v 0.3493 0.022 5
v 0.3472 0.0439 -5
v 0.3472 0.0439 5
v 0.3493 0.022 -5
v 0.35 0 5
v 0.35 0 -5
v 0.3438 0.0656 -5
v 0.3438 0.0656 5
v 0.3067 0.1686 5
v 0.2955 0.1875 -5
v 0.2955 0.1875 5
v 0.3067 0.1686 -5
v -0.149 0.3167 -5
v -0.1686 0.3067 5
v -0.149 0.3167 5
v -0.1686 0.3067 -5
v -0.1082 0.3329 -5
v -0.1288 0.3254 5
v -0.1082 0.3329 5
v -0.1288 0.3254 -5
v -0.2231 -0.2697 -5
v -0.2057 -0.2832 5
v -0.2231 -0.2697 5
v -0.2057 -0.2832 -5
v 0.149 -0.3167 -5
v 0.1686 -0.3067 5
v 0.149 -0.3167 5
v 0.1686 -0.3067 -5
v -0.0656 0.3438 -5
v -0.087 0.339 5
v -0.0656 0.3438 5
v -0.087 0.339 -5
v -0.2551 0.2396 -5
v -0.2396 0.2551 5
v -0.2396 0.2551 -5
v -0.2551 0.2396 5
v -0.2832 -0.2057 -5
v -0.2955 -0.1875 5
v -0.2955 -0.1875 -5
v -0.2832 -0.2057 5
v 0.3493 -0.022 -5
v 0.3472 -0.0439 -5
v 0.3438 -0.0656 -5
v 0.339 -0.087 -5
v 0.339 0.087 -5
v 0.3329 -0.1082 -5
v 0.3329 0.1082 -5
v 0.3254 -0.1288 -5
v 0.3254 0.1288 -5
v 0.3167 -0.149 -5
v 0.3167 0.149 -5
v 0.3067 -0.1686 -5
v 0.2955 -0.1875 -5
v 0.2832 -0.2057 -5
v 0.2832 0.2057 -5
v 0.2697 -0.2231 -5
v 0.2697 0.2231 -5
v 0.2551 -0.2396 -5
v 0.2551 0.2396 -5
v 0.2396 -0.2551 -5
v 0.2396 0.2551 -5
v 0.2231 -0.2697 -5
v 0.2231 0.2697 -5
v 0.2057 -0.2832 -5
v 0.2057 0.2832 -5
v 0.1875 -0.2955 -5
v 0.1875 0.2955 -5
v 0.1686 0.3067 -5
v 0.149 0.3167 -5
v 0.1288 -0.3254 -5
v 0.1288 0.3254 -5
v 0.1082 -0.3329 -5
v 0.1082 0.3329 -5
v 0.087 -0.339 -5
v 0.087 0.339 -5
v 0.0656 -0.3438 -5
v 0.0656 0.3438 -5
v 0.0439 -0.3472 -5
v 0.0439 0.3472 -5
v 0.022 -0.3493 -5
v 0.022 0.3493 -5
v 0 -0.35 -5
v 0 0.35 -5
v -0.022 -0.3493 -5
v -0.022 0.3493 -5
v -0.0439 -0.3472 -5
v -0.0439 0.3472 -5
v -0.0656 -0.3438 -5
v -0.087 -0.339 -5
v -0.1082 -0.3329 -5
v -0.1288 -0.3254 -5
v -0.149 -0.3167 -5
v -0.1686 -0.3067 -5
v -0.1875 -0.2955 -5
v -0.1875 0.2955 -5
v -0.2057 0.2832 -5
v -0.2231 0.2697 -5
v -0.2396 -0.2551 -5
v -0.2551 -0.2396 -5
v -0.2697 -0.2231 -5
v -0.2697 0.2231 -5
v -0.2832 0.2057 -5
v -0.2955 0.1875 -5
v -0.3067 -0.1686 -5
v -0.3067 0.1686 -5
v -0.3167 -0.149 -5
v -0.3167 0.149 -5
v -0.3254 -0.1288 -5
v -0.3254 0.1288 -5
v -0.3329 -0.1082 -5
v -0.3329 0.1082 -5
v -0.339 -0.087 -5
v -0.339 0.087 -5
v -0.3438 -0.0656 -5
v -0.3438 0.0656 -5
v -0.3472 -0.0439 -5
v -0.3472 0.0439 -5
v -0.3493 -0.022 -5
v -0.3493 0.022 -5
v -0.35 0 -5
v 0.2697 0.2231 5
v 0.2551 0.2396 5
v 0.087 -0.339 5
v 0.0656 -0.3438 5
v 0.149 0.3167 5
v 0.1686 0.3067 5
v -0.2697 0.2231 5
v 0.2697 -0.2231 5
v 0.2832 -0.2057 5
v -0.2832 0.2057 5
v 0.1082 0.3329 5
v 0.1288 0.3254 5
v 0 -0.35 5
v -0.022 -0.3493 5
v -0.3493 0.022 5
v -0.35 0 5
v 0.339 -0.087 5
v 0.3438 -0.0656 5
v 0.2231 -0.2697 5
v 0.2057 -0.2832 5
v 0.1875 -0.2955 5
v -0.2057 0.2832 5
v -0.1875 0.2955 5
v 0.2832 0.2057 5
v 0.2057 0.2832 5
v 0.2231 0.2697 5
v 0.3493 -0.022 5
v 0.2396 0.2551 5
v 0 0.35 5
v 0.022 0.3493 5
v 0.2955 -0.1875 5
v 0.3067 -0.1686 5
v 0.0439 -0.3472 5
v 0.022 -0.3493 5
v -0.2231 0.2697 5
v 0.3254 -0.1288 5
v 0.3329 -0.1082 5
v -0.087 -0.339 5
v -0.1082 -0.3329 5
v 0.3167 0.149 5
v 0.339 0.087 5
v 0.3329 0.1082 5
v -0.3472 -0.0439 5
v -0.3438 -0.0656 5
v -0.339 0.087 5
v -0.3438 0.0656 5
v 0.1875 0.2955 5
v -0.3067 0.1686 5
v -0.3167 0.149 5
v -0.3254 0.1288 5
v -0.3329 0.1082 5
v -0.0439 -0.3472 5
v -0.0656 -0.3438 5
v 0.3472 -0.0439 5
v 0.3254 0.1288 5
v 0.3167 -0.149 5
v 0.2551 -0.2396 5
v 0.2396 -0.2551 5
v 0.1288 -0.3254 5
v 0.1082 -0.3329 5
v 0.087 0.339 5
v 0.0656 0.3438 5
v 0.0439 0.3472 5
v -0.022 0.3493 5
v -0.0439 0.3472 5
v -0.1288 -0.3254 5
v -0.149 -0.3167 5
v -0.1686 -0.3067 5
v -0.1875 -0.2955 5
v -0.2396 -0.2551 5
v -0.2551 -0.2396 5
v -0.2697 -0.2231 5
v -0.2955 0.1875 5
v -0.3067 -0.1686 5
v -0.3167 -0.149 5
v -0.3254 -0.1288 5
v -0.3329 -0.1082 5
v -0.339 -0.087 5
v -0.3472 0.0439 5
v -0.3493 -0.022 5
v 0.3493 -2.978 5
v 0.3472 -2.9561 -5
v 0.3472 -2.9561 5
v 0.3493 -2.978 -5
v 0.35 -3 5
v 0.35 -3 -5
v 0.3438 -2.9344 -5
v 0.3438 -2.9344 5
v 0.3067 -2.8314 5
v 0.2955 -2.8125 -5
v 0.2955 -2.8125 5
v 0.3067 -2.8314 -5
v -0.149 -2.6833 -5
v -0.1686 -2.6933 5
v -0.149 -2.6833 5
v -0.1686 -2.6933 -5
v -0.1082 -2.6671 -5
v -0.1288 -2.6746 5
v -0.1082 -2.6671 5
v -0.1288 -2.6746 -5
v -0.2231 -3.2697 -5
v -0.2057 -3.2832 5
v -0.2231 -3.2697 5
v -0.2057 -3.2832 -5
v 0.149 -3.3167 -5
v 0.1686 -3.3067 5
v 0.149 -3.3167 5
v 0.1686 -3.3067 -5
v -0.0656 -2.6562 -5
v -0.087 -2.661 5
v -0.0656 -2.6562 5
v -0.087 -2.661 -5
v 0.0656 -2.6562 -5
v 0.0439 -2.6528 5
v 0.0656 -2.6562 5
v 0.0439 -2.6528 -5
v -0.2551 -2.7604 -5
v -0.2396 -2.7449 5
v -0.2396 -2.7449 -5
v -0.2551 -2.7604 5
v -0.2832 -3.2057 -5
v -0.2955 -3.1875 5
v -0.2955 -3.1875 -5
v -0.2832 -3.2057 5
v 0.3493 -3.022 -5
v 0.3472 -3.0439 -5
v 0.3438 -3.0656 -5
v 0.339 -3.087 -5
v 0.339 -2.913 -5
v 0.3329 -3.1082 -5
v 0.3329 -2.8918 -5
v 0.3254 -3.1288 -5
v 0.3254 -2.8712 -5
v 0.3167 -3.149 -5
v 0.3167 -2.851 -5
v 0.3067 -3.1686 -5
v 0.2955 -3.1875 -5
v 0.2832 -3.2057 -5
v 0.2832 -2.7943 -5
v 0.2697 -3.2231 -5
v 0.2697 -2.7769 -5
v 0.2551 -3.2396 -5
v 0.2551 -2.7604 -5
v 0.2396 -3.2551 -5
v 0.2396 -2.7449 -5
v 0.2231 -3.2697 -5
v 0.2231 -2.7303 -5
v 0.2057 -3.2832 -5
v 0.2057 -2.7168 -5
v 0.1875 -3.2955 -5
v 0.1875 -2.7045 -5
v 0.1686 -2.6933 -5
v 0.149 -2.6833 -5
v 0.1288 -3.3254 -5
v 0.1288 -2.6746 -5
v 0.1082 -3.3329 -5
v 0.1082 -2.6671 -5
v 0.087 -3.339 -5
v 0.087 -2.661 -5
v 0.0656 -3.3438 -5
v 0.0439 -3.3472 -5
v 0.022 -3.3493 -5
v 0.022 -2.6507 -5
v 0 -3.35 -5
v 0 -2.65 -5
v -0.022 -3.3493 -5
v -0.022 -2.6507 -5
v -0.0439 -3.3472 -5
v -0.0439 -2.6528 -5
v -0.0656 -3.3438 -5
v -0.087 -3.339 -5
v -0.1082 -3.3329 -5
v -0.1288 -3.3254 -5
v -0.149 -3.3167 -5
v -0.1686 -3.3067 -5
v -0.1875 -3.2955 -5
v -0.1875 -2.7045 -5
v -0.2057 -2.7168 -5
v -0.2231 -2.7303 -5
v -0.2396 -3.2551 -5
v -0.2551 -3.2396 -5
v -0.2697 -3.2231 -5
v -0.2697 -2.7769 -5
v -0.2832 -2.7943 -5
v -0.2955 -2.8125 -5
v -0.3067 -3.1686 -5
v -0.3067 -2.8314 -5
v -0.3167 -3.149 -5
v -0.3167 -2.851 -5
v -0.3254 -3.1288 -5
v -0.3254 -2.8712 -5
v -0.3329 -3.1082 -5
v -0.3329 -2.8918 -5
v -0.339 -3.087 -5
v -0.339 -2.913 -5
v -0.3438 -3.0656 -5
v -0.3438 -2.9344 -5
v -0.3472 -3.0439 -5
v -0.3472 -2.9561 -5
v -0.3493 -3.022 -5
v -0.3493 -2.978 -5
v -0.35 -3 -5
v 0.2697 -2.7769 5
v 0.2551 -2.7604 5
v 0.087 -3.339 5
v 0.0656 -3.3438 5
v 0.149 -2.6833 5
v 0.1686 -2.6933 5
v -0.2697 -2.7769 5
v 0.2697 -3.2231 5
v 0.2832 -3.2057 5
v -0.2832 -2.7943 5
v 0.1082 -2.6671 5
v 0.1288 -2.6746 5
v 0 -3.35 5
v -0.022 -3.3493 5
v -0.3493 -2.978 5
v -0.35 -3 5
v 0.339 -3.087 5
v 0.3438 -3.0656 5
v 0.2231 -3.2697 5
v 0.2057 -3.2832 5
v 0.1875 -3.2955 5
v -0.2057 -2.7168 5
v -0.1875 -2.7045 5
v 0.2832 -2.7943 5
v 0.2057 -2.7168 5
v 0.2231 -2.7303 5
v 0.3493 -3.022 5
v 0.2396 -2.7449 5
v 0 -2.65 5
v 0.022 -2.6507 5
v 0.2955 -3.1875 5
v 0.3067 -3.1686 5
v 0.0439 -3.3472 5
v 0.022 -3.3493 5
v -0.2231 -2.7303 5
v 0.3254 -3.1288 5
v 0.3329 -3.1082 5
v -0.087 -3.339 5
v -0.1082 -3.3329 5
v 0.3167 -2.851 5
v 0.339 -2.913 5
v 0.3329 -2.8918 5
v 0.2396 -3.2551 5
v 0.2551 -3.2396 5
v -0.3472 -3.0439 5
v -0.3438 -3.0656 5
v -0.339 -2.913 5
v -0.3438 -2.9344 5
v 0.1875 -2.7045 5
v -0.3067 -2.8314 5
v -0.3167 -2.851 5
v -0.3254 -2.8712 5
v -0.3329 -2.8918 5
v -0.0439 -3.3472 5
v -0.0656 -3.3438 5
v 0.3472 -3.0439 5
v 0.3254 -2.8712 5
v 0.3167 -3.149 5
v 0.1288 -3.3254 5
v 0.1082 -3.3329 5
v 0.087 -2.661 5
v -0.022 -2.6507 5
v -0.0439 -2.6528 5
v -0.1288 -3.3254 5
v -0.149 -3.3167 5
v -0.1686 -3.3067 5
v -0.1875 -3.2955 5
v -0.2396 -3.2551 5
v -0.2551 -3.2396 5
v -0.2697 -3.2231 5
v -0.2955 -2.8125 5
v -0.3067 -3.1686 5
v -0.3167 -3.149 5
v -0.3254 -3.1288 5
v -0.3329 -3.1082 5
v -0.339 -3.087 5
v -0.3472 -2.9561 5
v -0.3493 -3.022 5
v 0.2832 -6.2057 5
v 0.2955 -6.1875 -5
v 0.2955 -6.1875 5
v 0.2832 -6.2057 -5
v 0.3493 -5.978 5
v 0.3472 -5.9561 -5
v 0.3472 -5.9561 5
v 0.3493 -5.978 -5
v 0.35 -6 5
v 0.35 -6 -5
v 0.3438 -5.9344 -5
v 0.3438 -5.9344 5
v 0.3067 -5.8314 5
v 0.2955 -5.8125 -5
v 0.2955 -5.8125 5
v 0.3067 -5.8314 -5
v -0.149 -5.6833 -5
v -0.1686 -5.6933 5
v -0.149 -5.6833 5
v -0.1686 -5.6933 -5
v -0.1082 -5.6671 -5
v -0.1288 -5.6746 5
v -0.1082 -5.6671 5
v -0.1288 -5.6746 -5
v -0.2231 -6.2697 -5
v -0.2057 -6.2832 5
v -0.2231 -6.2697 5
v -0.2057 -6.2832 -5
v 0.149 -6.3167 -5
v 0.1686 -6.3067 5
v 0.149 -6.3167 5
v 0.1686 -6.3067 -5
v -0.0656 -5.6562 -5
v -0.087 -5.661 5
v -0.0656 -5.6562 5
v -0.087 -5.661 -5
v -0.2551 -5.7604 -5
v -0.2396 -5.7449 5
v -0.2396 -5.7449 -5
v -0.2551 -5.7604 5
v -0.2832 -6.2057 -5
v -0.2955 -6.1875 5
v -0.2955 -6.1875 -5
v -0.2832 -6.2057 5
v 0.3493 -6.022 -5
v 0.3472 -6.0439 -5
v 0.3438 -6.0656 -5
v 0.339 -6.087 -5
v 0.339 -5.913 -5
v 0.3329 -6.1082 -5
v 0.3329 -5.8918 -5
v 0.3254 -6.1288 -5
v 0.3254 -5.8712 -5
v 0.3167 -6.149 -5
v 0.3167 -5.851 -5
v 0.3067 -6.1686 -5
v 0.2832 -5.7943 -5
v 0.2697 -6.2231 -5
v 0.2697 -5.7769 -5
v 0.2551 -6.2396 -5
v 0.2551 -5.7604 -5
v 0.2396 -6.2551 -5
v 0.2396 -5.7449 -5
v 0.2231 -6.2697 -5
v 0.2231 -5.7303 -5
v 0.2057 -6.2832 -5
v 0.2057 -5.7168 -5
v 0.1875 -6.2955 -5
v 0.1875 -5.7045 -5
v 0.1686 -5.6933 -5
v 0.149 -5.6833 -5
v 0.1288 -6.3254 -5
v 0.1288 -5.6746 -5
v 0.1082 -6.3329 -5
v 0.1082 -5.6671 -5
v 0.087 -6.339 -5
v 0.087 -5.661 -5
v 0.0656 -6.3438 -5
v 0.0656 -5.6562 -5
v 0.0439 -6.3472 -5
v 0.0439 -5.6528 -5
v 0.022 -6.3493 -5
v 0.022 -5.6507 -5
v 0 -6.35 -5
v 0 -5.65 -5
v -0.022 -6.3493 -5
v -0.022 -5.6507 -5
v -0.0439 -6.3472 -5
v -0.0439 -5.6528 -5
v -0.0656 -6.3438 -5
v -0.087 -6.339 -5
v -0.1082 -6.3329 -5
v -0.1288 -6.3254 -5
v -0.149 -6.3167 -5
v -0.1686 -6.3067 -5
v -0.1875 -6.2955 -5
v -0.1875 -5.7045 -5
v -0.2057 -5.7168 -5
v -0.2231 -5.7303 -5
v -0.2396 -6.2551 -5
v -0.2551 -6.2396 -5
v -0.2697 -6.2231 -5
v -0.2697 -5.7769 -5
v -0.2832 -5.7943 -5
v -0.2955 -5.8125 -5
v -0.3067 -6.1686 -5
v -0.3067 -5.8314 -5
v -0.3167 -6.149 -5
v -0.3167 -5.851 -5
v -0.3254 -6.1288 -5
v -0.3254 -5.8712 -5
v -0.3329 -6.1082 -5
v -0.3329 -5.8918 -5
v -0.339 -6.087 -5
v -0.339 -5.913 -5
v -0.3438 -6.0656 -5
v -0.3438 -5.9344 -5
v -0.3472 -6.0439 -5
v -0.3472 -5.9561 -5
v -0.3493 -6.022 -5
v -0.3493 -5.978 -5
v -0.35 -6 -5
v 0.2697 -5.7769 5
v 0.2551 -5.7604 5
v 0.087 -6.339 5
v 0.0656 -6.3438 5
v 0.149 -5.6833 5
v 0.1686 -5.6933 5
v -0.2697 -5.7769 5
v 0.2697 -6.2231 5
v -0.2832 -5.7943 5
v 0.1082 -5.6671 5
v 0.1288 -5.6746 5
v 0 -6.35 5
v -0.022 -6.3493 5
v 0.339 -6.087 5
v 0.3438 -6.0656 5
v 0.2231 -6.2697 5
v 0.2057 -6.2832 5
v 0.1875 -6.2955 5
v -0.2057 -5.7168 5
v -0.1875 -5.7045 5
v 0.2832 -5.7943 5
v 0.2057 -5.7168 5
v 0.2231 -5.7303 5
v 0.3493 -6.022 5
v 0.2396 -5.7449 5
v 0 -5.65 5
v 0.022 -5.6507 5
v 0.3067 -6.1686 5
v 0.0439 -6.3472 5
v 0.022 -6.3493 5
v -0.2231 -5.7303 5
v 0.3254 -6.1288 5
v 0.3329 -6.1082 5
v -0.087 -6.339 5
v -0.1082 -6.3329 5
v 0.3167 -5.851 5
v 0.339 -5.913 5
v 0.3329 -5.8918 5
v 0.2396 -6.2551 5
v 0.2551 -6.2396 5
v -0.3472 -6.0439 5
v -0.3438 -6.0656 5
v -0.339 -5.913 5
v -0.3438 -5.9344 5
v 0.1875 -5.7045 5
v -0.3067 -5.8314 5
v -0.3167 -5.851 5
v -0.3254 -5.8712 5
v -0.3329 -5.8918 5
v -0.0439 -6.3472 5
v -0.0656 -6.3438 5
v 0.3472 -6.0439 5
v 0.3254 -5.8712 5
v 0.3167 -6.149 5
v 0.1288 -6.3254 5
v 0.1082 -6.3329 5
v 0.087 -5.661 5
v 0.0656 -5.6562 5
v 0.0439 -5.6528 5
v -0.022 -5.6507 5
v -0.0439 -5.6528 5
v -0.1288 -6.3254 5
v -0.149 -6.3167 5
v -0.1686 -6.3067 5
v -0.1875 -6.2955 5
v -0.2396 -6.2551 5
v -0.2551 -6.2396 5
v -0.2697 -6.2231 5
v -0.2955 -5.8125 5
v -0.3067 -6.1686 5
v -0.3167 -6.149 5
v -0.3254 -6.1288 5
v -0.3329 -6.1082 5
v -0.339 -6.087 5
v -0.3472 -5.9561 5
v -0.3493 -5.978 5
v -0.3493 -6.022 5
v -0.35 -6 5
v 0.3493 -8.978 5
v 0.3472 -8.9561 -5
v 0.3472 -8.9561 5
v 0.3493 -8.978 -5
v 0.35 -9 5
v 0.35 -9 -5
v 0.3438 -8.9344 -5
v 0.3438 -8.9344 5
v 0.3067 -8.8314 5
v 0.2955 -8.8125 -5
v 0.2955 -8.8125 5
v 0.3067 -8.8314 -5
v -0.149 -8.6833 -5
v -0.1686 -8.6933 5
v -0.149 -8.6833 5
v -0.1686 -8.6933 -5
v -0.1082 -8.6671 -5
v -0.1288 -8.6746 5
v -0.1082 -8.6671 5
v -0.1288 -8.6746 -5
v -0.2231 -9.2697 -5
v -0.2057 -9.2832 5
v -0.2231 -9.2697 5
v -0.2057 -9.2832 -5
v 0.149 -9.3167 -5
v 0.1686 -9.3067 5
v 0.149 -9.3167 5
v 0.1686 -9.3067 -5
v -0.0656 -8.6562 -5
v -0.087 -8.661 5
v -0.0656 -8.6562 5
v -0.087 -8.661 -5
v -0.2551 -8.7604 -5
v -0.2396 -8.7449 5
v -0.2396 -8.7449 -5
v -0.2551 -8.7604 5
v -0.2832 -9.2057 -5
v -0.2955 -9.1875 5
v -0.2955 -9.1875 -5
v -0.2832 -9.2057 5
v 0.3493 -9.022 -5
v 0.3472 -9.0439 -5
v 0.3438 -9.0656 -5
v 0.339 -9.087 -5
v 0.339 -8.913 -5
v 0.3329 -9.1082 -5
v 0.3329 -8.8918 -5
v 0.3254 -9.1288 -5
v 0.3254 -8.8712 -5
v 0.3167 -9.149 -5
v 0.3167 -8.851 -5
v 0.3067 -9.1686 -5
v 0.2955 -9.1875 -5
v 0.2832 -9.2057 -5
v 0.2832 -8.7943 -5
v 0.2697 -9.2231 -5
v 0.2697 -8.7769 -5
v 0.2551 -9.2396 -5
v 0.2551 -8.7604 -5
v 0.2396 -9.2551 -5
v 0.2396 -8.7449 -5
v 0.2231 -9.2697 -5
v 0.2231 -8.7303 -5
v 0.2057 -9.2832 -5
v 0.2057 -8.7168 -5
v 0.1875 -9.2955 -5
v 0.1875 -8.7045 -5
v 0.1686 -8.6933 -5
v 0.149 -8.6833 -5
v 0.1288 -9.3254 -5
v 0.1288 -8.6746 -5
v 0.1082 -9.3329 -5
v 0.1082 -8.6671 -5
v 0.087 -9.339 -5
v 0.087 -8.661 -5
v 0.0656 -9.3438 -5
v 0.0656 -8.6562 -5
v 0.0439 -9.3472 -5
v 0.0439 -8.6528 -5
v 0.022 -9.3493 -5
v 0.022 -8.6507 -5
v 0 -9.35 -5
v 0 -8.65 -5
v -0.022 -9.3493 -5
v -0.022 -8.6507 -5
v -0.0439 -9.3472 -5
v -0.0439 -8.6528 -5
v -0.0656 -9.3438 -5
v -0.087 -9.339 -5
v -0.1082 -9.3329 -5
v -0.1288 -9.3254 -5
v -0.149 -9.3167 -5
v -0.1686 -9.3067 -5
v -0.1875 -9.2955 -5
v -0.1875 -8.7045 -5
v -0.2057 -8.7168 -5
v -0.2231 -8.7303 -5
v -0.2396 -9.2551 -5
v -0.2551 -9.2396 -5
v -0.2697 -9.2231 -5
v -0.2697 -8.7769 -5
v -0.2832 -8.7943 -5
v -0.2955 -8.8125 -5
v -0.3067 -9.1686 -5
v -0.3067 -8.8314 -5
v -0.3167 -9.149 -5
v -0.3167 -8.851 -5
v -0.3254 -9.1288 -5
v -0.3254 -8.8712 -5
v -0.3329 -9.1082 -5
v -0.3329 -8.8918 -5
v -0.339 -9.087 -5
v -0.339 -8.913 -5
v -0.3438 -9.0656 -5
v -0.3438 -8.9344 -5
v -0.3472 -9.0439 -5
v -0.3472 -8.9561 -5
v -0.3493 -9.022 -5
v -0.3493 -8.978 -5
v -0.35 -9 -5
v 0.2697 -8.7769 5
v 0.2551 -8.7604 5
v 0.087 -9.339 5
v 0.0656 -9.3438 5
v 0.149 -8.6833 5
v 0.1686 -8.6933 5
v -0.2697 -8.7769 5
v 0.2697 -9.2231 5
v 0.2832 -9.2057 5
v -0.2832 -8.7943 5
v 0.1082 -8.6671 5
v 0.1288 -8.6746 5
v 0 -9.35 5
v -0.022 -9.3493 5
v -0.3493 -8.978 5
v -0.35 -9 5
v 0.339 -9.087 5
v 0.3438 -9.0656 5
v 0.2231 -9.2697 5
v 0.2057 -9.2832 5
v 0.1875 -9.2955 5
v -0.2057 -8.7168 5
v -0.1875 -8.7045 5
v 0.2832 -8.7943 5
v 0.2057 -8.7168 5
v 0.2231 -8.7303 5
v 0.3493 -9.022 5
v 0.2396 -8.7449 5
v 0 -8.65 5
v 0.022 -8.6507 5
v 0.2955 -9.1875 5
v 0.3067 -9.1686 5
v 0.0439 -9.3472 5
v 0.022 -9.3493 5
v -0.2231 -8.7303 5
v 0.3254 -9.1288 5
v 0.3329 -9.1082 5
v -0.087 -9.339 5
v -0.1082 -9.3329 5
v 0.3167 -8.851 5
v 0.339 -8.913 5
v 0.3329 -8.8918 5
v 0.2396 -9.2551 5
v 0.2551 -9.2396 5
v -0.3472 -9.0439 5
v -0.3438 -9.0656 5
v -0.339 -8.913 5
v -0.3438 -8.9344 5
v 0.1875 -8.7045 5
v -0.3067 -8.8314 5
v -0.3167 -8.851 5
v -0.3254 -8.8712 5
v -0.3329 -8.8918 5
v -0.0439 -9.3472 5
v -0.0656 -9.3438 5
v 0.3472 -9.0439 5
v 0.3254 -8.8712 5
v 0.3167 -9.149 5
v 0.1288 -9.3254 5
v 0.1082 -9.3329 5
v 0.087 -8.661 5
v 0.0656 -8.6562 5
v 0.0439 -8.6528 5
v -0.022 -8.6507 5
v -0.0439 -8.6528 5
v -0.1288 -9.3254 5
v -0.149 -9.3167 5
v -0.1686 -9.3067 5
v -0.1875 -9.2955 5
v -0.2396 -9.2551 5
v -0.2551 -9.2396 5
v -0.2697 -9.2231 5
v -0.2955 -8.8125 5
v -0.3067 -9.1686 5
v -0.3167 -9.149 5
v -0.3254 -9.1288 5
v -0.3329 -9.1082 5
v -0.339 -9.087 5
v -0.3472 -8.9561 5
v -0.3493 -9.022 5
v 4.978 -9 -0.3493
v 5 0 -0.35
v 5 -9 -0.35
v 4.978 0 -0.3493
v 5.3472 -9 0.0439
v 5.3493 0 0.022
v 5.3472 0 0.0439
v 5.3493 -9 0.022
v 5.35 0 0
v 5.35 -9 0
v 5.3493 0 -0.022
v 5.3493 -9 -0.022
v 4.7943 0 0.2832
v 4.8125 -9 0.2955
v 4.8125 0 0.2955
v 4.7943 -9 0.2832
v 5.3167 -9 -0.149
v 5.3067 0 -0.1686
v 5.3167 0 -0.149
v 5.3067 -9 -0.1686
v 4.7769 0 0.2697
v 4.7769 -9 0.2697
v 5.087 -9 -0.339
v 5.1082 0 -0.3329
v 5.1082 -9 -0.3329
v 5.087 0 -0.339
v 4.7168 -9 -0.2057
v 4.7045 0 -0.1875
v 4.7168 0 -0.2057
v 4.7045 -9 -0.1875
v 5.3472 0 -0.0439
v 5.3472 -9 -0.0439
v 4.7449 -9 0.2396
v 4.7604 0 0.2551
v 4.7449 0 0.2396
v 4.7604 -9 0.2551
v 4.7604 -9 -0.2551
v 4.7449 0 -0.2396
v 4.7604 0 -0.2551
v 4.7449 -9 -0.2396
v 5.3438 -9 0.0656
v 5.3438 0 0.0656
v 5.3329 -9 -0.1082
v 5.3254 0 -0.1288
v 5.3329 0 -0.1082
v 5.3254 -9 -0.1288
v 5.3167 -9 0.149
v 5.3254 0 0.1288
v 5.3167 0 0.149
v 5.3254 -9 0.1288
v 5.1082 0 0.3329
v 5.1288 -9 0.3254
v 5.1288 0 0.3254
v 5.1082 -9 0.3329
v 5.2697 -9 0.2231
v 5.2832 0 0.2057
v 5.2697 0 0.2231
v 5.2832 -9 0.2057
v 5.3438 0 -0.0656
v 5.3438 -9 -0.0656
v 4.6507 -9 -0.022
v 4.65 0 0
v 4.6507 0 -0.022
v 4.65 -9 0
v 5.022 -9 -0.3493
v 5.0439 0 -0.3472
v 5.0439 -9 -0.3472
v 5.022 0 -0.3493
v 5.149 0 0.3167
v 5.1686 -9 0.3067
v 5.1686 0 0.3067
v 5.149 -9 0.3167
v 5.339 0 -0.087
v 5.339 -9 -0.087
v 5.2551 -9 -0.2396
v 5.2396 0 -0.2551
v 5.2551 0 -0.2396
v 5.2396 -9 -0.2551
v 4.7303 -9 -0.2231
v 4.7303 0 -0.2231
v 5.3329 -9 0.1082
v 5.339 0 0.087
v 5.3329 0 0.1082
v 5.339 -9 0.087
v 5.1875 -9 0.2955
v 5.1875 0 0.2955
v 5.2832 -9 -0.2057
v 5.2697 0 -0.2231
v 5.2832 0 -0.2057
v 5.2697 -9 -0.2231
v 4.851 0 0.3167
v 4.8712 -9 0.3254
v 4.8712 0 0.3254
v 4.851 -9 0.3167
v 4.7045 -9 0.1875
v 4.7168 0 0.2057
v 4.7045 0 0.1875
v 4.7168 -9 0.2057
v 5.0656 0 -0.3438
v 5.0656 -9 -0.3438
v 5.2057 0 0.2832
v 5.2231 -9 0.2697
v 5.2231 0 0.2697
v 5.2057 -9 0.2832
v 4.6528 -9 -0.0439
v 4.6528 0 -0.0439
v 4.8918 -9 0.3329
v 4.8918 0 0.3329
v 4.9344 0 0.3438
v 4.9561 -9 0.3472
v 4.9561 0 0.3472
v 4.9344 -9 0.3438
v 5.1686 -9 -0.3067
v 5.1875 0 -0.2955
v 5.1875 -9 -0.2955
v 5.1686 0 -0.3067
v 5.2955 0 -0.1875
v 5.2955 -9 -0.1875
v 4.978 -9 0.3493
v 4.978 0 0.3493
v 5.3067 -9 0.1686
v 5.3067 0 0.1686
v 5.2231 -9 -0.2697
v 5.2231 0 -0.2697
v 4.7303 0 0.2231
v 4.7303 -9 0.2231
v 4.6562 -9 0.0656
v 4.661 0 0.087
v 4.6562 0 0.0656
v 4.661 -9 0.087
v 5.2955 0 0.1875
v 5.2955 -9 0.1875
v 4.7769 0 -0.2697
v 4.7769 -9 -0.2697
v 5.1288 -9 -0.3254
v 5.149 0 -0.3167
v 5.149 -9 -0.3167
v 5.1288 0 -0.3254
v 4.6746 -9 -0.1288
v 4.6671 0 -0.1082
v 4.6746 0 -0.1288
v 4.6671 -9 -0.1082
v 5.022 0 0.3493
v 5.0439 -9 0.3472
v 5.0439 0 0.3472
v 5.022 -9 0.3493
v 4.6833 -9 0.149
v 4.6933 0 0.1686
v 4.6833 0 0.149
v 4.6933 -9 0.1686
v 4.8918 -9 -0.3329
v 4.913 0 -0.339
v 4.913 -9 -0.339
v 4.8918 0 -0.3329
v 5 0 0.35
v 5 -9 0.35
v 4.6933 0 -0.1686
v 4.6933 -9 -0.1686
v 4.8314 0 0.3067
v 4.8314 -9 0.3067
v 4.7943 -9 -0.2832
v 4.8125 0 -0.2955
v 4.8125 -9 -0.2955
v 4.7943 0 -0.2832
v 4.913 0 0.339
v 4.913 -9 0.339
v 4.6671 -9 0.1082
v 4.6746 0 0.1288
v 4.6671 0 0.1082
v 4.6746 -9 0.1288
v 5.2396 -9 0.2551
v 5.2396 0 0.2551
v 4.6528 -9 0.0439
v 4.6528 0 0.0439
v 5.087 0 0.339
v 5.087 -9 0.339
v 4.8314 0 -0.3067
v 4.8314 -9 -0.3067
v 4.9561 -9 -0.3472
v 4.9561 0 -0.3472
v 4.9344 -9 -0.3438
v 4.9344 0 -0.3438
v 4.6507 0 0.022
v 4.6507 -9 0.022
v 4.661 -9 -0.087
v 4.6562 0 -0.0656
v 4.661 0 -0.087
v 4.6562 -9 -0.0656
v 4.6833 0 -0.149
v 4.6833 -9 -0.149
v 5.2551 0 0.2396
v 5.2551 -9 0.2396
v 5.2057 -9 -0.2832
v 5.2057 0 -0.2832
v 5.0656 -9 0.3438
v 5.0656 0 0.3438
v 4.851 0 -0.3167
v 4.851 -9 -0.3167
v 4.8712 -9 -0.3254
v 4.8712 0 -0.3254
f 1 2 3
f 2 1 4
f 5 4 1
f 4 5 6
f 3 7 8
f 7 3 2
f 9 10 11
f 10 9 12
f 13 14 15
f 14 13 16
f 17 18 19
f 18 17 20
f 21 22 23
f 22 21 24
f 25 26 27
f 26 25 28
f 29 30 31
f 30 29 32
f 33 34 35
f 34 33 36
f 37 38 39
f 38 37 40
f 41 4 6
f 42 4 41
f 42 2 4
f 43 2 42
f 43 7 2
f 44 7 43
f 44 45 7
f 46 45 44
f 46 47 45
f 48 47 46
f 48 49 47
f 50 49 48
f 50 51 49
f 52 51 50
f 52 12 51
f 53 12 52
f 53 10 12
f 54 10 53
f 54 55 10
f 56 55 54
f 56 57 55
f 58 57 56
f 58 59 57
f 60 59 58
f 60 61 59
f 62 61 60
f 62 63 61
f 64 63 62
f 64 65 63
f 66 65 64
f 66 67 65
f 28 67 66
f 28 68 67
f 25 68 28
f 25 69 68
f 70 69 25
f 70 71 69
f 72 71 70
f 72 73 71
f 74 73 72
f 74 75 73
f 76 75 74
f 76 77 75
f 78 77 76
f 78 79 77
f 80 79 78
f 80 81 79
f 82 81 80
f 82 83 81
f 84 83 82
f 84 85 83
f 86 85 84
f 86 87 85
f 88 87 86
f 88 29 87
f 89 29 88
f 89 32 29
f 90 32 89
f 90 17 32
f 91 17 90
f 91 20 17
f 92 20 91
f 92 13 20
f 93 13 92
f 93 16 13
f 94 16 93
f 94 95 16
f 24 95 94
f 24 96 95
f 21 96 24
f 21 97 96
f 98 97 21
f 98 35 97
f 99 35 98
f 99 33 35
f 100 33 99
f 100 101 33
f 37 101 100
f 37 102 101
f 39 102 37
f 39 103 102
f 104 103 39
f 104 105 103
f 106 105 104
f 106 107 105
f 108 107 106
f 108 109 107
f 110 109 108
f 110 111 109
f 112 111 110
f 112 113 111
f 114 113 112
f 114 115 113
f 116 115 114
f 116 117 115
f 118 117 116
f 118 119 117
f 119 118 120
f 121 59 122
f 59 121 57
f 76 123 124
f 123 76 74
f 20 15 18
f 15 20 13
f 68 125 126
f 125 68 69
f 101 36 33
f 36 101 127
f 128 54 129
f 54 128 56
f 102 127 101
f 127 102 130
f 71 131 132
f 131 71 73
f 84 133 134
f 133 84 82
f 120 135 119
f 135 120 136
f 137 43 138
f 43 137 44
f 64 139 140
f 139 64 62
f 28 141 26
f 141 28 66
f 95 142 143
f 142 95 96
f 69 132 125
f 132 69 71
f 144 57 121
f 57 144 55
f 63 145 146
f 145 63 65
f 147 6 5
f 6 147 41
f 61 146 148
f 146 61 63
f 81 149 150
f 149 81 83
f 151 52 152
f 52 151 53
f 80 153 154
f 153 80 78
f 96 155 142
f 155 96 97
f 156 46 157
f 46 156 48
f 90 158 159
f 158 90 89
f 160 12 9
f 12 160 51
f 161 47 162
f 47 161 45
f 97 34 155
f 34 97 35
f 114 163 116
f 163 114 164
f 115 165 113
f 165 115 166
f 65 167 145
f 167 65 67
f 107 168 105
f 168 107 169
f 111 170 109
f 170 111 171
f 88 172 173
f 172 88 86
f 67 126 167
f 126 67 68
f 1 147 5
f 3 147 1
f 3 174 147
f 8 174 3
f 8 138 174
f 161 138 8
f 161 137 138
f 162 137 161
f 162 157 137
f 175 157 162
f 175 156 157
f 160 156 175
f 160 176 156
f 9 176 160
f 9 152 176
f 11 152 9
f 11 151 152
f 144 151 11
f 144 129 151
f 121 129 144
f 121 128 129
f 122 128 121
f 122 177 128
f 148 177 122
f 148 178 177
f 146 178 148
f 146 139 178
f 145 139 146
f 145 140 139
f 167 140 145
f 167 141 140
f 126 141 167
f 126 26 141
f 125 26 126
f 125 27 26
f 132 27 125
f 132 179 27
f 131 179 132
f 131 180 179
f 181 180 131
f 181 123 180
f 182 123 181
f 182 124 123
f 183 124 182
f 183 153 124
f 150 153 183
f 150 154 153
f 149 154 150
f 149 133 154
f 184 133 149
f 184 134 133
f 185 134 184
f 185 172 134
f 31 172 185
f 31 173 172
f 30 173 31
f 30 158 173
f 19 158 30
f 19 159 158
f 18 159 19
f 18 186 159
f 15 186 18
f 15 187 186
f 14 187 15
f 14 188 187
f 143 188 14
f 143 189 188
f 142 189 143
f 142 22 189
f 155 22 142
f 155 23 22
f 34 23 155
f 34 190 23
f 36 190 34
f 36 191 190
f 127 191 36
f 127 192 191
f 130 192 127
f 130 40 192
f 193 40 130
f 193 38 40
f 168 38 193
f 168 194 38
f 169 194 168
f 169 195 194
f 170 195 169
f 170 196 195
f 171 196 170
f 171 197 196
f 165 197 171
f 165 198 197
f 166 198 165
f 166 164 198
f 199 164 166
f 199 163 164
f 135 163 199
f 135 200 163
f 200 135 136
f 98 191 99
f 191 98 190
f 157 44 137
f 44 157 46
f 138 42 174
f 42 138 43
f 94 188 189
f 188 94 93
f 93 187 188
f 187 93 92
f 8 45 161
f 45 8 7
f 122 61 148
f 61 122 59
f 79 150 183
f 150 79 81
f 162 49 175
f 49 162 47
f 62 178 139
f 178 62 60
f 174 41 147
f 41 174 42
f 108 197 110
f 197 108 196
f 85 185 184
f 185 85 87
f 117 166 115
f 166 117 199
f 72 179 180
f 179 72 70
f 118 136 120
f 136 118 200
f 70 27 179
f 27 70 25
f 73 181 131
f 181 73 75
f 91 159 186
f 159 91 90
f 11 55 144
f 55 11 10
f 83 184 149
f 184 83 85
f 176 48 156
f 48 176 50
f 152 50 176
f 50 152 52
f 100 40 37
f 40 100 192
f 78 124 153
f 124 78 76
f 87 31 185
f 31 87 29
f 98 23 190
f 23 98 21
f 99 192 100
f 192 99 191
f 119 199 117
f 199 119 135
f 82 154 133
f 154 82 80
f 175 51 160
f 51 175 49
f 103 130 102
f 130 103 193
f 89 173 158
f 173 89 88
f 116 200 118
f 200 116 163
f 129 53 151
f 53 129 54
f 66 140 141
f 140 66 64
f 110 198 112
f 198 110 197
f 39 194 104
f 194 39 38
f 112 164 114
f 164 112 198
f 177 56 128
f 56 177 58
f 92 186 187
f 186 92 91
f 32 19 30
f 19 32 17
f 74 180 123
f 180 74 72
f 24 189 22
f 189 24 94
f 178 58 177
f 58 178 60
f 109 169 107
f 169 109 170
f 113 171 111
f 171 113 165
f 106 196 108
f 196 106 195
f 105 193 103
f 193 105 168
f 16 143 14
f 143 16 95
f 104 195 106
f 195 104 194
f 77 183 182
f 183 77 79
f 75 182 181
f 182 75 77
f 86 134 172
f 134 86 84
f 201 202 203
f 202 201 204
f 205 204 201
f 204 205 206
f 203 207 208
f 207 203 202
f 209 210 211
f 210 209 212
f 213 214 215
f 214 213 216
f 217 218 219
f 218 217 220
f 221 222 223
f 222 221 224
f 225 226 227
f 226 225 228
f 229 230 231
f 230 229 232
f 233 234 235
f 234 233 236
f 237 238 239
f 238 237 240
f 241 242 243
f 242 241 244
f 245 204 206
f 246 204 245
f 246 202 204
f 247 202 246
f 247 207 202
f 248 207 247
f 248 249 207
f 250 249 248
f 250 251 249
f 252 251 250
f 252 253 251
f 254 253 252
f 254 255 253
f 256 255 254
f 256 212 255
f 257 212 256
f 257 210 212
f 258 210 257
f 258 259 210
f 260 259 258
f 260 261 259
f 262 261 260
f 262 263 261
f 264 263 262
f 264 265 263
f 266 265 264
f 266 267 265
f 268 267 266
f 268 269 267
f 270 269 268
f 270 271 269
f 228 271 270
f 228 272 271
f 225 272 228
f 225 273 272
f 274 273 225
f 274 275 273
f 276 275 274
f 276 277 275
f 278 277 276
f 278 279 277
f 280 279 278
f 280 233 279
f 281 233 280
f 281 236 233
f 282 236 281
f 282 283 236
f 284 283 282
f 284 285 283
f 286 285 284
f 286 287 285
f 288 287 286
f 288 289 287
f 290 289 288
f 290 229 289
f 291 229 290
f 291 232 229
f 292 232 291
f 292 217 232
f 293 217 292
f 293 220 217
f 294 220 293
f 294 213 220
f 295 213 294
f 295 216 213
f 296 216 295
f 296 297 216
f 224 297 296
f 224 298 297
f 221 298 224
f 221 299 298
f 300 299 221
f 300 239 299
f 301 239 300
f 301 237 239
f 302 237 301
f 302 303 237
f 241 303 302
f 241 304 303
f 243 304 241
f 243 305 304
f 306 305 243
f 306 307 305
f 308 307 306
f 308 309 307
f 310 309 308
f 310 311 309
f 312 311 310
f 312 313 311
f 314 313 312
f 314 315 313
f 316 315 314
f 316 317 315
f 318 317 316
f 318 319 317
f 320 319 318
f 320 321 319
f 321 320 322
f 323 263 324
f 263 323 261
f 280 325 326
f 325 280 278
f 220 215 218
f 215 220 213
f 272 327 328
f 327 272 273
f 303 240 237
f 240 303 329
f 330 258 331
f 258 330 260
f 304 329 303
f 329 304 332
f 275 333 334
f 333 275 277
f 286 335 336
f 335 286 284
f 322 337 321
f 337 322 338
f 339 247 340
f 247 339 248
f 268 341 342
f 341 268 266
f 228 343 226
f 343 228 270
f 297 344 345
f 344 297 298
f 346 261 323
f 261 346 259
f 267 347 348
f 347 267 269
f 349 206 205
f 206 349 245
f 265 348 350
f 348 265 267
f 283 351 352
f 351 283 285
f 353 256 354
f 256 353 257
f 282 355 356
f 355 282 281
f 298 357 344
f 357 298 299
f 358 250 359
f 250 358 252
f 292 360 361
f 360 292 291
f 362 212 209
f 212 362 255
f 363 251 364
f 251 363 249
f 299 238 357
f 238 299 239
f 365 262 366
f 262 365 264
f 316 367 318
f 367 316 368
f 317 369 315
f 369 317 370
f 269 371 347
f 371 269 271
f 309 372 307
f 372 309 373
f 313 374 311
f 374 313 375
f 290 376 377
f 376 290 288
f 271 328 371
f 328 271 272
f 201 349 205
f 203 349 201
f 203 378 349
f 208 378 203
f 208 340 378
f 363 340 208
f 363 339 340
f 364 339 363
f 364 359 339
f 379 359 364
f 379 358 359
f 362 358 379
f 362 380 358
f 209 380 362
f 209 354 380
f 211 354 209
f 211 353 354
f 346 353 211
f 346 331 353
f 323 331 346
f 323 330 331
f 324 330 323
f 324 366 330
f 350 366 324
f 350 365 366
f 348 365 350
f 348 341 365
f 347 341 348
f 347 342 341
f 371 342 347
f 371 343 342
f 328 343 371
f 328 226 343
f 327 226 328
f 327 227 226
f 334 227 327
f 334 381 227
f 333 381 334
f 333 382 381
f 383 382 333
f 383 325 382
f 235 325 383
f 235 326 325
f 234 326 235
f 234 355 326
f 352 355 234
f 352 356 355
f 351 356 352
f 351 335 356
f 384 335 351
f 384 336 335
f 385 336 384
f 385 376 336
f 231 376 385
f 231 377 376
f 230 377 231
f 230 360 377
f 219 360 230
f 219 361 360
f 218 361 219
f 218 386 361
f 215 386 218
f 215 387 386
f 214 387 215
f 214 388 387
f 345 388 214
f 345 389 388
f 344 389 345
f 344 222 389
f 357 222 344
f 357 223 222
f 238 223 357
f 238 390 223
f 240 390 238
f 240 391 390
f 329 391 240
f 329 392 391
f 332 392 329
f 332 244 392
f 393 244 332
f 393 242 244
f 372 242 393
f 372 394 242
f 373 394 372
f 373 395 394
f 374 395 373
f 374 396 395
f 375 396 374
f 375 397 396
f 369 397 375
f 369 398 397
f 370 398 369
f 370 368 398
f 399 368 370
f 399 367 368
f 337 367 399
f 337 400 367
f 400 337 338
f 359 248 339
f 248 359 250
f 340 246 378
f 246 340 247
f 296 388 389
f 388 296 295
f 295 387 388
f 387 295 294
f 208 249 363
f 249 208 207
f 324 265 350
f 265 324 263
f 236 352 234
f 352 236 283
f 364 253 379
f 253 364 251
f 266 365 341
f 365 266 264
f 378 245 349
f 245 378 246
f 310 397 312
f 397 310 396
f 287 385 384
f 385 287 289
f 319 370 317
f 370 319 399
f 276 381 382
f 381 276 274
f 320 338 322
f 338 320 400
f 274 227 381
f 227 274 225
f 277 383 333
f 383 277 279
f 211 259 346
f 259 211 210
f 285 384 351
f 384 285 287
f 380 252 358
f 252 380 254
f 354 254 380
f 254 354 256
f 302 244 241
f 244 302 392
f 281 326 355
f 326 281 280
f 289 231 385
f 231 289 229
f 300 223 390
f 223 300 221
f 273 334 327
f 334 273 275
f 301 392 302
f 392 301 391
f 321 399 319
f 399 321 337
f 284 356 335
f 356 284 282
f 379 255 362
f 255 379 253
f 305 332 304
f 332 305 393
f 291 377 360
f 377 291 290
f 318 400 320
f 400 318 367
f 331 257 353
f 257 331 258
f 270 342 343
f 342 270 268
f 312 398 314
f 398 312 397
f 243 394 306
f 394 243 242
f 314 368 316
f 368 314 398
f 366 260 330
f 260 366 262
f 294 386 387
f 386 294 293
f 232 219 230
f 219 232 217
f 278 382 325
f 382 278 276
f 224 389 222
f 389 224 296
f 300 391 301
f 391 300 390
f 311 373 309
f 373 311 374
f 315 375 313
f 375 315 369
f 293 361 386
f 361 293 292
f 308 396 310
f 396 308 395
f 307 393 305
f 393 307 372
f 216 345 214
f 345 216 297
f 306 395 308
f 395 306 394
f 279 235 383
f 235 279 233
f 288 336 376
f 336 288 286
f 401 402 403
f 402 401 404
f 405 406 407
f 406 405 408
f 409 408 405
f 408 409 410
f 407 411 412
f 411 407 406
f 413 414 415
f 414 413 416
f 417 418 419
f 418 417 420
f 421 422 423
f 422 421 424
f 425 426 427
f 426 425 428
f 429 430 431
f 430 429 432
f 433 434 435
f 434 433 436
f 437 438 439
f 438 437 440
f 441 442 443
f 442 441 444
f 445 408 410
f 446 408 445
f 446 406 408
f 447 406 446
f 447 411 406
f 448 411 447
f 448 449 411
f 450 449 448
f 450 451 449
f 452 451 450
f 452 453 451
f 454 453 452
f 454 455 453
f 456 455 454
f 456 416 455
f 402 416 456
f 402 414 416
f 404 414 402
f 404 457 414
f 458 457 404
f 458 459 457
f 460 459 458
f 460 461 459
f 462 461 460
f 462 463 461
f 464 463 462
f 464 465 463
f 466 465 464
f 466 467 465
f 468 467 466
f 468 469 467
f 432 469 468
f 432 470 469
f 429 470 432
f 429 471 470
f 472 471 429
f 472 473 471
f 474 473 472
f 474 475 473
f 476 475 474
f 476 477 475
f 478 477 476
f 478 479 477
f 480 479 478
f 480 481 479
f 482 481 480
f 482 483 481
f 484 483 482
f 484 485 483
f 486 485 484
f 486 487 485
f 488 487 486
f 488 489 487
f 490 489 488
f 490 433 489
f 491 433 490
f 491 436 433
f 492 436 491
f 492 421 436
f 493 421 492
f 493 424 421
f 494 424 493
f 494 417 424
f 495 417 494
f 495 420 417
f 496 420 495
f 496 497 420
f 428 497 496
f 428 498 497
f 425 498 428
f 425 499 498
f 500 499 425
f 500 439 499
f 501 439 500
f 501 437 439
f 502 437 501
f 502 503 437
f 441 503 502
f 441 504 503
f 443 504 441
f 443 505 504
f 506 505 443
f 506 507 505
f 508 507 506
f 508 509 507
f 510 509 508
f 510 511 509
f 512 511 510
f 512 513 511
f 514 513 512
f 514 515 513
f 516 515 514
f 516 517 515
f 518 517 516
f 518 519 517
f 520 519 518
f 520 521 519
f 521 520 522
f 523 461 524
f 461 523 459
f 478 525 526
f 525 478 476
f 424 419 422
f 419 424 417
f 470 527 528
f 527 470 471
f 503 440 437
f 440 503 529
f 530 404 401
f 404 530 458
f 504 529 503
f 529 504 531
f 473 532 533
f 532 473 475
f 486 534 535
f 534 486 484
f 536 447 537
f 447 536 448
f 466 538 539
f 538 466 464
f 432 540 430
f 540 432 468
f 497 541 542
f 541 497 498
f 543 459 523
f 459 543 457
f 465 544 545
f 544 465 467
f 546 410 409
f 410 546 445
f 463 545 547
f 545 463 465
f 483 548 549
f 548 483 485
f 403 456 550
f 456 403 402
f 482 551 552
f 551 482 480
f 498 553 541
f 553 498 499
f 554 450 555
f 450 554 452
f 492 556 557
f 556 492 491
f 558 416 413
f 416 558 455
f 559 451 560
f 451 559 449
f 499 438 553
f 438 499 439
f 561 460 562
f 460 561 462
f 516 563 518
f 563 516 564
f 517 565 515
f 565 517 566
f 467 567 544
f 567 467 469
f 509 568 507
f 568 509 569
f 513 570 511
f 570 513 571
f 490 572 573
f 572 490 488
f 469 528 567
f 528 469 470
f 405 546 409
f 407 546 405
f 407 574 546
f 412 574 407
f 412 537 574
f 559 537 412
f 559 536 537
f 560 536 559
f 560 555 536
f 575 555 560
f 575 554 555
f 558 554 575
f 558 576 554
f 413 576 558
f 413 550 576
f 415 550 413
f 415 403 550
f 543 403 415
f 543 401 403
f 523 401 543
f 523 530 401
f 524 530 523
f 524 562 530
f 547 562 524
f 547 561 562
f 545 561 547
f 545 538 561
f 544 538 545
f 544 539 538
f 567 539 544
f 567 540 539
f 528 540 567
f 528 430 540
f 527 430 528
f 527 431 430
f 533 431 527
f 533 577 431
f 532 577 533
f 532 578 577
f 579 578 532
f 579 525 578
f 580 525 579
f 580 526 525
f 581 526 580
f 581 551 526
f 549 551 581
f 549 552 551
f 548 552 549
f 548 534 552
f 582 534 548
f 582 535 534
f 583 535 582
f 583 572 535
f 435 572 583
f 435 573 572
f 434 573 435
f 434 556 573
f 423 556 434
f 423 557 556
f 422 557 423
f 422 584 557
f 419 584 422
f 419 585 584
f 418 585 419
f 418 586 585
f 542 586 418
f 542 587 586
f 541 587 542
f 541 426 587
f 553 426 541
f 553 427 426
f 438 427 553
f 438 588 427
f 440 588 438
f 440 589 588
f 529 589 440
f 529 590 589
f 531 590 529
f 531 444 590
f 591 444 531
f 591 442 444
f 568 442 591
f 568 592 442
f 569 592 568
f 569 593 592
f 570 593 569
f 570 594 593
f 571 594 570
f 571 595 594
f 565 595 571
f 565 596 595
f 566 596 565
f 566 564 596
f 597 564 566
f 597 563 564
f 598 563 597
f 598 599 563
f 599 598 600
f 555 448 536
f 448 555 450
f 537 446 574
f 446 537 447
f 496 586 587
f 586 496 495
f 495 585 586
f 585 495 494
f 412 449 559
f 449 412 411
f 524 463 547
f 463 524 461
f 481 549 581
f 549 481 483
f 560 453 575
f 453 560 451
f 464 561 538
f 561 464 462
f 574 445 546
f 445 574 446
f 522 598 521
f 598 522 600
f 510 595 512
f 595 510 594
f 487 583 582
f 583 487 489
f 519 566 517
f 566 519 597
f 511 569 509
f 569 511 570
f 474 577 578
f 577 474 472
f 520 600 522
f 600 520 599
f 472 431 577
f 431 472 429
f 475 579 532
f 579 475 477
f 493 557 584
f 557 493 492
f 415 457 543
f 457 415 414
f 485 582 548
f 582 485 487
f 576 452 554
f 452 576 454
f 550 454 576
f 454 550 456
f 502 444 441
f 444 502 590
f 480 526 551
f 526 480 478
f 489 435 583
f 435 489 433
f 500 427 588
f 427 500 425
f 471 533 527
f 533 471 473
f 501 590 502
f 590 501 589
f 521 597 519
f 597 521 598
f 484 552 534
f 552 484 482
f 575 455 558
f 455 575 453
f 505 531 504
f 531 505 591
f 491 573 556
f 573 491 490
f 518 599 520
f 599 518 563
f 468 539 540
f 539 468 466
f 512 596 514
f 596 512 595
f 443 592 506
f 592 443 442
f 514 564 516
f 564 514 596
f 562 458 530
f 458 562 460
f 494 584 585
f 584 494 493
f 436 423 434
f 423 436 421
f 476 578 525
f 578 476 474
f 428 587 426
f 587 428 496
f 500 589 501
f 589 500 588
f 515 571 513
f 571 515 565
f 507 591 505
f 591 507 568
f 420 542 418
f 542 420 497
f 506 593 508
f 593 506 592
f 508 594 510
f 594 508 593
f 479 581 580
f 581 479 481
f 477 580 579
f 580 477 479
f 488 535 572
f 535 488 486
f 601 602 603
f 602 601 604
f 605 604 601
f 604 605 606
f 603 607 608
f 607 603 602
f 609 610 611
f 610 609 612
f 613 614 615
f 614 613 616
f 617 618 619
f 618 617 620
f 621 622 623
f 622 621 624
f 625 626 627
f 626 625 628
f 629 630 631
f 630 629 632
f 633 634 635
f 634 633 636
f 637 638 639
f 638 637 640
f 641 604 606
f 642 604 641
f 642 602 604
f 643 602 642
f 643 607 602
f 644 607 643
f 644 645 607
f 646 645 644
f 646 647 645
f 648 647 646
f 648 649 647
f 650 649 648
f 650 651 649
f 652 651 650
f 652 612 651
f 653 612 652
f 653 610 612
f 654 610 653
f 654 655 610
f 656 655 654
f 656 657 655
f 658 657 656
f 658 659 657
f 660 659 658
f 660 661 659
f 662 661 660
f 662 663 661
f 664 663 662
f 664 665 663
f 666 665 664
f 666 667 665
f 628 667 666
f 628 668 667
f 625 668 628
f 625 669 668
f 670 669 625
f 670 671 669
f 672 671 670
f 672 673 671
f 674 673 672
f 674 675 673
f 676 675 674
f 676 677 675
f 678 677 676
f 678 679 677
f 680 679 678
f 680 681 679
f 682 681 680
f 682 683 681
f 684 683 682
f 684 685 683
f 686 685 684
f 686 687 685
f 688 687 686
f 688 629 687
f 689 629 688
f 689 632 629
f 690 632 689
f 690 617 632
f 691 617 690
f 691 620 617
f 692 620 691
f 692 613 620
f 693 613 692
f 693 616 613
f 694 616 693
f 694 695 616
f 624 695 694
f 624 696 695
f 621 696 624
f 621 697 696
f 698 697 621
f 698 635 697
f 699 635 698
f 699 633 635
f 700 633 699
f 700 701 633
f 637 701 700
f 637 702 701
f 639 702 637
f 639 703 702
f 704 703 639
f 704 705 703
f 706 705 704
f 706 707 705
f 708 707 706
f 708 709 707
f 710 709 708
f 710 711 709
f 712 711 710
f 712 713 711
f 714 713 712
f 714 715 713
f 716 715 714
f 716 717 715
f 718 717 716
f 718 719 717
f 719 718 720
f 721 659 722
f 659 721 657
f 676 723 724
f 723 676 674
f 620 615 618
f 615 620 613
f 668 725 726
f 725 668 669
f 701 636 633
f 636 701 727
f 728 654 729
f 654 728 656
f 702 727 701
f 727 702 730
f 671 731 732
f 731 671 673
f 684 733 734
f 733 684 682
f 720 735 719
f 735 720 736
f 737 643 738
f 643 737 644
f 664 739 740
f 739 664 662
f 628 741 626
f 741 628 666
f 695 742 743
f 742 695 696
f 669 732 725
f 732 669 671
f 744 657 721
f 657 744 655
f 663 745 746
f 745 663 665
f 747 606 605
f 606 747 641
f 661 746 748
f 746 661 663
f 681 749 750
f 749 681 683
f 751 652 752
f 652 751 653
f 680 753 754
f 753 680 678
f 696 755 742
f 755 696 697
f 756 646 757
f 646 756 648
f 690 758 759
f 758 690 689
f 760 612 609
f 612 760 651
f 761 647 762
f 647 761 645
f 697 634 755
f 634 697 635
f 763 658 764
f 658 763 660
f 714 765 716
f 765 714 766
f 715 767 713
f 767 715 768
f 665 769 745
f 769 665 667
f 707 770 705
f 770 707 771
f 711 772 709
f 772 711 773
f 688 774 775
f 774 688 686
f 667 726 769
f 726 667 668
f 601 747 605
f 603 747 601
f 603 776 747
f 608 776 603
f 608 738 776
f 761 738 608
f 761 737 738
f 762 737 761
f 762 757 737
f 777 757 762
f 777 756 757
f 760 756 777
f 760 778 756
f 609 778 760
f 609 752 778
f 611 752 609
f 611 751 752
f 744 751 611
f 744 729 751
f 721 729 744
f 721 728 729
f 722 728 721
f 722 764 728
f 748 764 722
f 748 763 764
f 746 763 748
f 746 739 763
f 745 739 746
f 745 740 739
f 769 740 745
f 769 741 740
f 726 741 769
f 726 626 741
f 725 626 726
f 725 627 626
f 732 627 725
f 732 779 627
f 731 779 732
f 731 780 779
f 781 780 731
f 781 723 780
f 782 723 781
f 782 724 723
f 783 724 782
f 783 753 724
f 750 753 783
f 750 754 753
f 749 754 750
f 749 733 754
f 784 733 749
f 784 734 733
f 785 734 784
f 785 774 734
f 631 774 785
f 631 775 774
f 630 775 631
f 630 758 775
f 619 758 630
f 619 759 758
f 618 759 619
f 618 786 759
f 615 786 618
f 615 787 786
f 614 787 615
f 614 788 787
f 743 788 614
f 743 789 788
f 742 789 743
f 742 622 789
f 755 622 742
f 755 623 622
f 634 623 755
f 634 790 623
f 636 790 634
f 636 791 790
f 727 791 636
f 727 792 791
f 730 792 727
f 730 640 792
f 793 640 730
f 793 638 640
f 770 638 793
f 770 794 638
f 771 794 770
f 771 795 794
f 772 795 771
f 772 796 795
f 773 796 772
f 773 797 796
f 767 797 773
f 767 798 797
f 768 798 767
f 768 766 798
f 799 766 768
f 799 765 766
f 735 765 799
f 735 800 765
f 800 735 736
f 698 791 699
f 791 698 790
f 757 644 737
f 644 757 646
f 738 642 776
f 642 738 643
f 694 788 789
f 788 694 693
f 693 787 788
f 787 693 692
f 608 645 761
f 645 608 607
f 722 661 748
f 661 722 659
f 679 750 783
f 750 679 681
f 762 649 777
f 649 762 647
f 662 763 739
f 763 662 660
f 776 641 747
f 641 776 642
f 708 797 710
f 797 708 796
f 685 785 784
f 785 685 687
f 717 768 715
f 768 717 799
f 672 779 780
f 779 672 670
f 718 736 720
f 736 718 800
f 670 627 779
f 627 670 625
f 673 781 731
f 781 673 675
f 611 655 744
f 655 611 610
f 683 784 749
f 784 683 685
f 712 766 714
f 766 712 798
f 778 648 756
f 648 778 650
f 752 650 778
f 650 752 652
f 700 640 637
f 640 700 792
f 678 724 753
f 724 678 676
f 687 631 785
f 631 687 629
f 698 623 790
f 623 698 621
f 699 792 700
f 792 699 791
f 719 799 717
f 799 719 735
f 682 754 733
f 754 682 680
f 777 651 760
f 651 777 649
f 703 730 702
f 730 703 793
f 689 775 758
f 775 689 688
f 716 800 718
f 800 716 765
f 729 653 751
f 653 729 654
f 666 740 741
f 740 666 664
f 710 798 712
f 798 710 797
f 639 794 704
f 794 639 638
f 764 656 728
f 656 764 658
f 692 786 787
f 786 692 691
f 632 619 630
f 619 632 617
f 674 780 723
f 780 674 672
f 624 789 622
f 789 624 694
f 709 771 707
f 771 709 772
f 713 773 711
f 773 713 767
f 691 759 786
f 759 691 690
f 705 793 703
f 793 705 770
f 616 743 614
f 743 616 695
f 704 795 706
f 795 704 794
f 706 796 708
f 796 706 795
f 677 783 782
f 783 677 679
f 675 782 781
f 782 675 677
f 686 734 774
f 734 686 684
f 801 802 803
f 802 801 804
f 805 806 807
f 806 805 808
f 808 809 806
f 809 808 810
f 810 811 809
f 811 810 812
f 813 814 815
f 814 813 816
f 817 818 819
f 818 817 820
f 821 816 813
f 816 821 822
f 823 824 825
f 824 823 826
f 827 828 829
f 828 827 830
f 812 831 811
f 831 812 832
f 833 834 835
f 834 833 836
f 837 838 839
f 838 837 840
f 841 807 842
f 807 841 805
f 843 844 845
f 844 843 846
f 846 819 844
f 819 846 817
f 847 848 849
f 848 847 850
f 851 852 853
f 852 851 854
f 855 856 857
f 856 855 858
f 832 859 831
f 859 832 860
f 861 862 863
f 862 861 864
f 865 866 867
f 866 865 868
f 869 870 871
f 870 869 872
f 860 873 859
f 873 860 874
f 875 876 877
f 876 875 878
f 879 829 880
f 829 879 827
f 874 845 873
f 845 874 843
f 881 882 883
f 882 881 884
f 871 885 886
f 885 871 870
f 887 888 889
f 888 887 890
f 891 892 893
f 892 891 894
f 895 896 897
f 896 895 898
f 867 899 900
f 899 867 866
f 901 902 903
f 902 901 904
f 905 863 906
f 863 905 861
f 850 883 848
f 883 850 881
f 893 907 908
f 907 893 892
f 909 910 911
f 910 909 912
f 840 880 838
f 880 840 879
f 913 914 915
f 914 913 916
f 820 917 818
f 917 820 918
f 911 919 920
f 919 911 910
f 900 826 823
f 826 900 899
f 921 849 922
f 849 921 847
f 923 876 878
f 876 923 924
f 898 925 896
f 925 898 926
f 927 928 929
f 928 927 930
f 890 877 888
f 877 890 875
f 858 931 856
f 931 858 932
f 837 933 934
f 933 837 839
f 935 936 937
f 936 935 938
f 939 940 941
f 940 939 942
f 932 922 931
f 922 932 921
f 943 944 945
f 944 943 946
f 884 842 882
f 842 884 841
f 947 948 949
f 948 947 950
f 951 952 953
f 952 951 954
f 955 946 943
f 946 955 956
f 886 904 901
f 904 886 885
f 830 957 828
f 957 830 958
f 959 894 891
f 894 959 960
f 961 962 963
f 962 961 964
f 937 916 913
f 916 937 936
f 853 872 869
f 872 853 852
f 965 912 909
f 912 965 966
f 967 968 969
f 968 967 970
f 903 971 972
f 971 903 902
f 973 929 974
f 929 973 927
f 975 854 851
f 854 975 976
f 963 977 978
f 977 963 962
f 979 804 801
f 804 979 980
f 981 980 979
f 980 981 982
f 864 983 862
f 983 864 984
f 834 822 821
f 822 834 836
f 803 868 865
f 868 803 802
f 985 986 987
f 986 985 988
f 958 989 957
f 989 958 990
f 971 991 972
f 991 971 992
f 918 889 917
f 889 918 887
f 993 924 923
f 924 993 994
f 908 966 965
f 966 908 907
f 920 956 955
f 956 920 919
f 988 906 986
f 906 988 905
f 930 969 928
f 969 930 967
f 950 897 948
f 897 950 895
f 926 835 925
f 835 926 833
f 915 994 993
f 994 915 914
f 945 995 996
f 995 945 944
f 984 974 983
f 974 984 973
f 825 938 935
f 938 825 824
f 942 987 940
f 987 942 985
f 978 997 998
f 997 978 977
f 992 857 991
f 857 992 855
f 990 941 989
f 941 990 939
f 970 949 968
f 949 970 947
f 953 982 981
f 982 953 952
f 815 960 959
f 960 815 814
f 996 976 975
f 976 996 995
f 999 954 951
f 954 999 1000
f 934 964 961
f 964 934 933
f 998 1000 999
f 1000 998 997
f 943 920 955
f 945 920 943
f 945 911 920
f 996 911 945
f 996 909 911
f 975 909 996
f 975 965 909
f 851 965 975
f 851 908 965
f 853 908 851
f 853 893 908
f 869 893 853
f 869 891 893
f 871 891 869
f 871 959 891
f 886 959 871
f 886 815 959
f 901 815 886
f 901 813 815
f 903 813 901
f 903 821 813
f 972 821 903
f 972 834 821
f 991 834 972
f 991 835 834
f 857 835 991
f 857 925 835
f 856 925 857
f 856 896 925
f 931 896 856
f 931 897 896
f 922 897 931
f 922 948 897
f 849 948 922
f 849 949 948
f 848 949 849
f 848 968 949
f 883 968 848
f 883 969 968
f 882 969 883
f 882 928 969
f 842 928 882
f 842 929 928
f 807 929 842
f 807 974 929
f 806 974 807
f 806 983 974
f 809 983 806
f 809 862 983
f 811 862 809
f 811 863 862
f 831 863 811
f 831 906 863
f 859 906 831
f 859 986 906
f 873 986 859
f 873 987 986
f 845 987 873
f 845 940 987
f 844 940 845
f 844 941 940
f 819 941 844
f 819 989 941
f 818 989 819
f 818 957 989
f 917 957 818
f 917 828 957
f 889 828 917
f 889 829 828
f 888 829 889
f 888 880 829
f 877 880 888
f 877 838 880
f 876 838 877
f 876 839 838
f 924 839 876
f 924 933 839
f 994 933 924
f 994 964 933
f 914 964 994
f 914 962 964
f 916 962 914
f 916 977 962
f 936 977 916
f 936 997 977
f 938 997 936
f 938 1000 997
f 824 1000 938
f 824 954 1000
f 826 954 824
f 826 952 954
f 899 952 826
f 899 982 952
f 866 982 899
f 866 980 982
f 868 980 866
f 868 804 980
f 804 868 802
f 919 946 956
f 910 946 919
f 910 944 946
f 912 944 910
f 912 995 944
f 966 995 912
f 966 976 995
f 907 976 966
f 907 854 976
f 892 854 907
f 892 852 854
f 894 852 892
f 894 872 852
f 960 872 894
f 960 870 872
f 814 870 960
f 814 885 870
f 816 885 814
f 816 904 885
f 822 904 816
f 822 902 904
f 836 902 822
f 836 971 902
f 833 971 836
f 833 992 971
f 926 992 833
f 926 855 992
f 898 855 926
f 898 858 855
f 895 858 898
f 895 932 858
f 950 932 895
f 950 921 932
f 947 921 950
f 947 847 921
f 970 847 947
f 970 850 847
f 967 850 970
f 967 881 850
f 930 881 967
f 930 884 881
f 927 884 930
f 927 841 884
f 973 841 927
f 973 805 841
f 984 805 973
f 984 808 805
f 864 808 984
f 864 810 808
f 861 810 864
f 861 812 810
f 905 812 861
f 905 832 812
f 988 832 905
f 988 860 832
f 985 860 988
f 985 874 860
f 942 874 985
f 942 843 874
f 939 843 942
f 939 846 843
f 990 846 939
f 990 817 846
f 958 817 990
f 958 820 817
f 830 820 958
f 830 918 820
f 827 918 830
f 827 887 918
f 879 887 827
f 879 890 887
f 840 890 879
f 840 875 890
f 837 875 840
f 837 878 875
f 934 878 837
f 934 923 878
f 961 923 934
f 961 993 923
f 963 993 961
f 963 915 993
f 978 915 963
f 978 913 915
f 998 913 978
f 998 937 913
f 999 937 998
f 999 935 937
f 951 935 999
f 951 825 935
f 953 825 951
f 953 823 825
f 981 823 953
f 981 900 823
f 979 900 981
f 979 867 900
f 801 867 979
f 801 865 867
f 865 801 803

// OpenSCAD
/* 
	Supplemental Serpentine 3

*/

$fn = 100; // increase the smoothness of the cylinders

// Define the dimensions
channel_diameter = 0.7; // Diameter of the channel
long_length = 10; // Length of the longer segment
short_length = 3; // Length of the shorter segment

// Long segments
translate([0, 0, 0])
    cylinder(h=long_length, d=channel_diameter, center=true);

translate([0, -short_length, 0])
    cylinder(h=long_length, d=channel_diameter, center=true);

translate([0, -2*short_length, 0])
    cylinder(h=long_length, d=channel_diameter, center=true);

translate([0, -3*short_length, 0])
    cylinder(h=long_length, d=channel_diameter, center=true);

// Short segments
translate([long_length/2, -short_length/2, 0])
    rotate([90, 0, 0])
    cylinder(h=short_length, d=channel_diameter, center=true);

translate([long_length/2, -3*short_length/2, 0])
    rotate([90, 0, 0])
    cylinder(h=short_length, d=channel_diameter, center=true);

translate([long_length/2, -5*short_length/2, 0])
    rotate([90, 0, 0])
    cylinder(h=short_length, d=channel_diameter, center=true);
